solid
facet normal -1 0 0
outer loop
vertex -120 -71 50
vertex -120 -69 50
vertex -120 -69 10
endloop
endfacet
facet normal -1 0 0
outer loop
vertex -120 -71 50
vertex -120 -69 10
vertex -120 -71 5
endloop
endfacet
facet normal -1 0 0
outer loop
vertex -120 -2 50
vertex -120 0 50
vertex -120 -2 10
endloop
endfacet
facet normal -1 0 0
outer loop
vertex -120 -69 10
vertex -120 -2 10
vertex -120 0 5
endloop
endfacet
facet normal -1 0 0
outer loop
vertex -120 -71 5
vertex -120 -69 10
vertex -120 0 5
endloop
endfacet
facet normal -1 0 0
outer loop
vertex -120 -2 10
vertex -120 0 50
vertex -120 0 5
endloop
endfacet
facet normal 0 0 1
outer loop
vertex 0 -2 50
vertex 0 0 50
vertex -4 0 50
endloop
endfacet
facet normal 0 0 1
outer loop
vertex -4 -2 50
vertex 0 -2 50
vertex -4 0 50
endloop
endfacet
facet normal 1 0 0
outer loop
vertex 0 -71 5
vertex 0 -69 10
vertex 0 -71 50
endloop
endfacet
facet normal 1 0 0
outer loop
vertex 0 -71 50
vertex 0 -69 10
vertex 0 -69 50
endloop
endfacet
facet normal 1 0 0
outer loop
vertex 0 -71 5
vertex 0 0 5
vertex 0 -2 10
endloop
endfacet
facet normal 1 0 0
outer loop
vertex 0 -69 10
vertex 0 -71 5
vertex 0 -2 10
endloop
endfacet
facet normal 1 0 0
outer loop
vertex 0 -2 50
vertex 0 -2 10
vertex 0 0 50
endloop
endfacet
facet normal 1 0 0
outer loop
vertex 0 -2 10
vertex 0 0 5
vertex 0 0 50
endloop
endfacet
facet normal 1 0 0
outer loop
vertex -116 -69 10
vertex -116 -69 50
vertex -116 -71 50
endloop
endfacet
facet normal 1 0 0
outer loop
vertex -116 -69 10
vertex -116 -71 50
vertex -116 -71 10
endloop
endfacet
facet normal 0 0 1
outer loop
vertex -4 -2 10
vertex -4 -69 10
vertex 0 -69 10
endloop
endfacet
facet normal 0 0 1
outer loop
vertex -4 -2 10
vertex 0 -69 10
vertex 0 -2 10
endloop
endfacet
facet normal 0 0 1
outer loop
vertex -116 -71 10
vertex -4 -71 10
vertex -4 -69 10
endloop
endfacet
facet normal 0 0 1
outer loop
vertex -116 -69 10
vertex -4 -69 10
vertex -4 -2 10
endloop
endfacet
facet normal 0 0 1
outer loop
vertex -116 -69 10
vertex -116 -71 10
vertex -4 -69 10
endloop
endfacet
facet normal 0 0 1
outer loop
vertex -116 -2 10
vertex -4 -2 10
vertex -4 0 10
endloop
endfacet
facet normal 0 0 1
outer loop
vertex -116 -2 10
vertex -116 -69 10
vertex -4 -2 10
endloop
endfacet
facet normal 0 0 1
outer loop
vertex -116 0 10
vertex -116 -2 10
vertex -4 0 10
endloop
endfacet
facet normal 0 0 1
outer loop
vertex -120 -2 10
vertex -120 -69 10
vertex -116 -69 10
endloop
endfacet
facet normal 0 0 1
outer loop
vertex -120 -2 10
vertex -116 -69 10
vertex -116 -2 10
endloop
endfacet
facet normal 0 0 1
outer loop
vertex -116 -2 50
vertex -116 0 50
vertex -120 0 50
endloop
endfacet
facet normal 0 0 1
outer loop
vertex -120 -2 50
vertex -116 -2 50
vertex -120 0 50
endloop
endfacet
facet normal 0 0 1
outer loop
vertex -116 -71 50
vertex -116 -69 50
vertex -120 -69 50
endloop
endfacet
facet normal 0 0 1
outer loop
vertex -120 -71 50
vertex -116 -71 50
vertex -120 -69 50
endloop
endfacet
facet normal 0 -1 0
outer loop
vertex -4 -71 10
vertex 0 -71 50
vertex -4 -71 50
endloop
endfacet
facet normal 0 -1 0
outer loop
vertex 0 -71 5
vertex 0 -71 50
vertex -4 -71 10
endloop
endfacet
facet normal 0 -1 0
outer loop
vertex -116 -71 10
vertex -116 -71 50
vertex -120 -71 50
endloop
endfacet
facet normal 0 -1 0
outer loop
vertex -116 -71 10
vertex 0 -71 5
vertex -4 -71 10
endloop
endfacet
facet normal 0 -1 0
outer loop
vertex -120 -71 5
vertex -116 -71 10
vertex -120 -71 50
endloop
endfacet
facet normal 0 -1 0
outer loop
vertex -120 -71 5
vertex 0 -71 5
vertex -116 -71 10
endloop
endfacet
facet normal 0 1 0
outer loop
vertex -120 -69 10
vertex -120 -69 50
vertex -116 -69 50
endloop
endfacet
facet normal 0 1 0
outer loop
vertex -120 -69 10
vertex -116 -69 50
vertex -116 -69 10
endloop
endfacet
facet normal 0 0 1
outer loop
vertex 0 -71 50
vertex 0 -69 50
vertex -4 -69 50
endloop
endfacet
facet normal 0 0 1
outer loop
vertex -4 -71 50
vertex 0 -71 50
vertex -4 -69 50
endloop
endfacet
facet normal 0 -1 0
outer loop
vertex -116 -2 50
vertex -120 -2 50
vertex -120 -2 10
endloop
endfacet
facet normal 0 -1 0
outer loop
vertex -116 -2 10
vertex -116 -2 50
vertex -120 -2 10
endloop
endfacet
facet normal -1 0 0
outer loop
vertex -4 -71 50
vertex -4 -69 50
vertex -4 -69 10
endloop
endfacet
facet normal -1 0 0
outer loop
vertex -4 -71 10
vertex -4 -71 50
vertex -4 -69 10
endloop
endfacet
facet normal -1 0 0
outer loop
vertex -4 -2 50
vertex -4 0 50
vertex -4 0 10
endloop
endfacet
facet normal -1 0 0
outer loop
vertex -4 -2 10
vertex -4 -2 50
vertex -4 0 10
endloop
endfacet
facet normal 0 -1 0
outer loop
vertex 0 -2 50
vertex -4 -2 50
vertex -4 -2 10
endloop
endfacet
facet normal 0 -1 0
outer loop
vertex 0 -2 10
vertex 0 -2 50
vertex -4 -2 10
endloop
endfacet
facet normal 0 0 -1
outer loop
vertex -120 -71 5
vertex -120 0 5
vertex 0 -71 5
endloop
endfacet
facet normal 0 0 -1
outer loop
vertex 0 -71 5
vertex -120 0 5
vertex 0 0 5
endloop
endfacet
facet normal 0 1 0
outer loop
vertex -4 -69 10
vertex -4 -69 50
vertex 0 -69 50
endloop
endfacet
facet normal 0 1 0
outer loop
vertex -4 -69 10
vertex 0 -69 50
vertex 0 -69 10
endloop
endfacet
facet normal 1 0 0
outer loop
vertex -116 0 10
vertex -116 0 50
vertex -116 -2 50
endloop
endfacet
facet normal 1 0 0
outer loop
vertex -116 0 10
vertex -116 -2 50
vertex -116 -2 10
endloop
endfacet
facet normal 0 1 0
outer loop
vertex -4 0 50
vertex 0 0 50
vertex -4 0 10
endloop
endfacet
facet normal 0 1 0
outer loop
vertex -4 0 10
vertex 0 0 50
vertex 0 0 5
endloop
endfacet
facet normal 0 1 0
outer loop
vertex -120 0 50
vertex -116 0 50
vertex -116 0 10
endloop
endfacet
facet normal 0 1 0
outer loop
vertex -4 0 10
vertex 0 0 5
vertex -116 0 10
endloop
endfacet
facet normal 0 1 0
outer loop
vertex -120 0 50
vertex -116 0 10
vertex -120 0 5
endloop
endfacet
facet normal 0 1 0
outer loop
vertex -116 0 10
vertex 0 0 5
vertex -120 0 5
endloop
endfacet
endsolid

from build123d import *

# Parameters (mm, degrees)
F0_W     = 40
F0_H     = 400
F1_DEPTH = 710
F2_W     = 670
F2_H     = 400
F3_DEPTH = 1250
F4_SCALE = 0.1
F5_ANGLE = 180


with BuildPart() as f1:
    # F0 (on Front) → F1 (new body)
    with BuildSketch(Plane.XZ):
        Polygon((0, 50), (0, 0), (40, 0), (1160, 0), (1200, 0), (1200, 50), align=None)
        with Locations((20, -200)):
            Rectangle(F0_W, F0_H)
        with Locations((1180, -200)):
            Rectangle(F0_W, F0_H)
    extrude(amount=F1_DEPTH)

    # F2 (on face) → F3 (cut)
    with BuildSketch(Plane.YZ.offset(1200)):
        with Locations((-355, -200)):
            Rectangle(F2_W, F2_H)
    extrude(amount=-F3_DEPTH, mode=Mode.SUBTRACT)


with BuildPart() as f1_1:
    # F4: moved
    add(f1.part.scale(F4_SCALE))


with BuildPart() as f1_2:
    # F5: moved
    add(f1_1.part.rotate(Axis((0, -35.5, 5), (0, 1, 0)), F5_ANGLE))


solid = f1_2.part
